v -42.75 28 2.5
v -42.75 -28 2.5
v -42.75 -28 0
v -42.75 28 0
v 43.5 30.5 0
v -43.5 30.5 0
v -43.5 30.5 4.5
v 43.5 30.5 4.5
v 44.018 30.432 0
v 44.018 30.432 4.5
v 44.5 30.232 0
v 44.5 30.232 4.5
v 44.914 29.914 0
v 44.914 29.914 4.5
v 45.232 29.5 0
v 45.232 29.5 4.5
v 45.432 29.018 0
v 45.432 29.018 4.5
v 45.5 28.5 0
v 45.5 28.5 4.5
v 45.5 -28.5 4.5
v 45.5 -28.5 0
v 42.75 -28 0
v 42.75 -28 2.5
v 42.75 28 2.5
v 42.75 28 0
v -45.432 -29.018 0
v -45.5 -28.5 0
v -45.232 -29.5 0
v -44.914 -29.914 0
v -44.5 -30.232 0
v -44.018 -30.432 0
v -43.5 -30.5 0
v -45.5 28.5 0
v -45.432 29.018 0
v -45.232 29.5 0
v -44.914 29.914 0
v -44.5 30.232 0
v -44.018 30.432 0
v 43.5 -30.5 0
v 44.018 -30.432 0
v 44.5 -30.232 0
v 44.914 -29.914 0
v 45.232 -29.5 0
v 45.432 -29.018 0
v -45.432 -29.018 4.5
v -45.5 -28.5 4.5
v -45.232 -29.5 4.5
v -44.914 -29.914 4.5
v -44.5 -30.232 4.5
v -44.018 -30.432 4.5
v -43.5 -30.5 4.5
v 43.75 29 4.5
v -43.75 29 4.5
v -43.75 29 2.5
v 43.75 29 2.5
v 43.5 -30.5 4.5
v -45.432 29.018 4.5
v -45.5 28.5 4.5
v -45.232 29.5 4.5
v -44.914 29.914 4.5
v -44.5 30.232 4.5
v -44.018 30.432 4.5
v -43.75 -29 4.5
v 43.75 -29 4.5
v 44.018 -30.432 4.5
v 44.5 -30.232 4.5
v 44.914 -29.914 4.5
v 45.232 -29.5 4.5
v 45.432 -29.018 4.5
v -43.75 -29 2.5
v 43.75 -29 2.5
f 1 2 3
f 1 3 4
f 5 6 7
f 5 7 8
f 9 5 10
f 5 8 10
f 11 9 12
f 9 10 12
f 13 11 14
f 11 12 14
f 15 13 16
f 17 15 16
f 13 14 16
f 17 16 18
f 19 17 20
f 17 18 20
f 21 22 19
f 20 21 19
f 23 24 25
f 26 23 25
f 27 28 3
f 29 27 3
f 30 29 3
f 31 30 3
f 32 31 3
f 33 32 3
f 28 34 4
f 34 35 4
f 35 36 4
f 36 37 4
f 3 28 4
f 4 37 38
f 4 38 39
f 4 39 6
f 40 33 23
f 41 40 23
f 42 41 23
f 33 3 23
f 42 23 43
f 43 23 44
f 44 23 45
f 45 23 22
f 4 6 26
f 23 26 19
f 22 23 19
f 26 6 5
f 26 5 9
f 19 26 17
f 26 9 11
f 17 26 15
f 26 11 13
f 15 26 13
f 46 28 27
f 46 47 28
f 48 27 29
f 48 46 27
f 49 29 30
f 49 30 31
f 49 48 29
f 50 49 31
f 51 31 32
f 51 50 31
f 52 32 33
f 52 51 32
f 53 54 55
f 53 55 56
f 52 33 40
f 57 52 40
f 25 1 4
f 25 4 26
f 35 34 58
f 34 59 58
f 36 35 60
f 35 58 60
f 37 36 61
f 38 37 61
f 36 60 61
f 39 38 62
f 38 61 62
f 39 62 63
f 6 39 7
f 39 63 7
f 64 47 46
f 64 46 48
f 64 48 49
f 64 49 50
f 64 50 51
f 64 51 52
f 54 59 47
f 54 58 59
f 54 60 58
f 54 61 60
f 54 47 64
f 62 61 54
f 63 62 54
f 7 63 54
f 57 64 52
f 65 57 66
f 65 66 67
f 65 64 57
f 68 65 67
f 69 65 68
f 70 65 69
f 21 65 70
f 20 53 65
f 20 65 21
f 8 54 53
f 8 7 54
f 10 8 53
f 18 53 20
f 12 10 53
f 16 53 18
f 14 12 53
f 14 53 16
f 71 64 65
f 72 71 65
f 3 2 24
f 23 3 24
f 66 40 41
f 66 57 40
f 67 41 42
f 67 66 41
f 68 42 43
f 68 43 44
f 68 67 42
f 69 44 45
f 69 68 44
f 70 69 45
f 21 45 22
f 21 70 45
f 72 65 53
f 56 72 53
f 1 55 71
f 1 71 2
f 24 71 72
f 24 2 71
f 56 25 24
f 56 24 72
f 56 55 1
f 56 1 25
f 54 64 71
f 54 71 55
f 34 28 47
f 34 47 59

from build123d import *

# Parameters (mm, degrees)
SKETCH1_W           = 91
SKETCH1_H           = 61
BOSS_EXTRUDE1_DEPTH = 4.5
SKETCH2_W           = 87.5
SKETCH2_H           = 58
CUT_EXTRUDE1_DEPTH  = 2
SKETCH3_W           = 85.5
SKETCH3_H           = 56
CUT_EXTRUDE2_DEPTH  = 3.5
FILLET1_R           = 2


with BuildPart() as part:
    # Sketch1 → Boss-Extrude1 (new body)
    with BuildSketch(Plane.XY):
        Rectangle(SKETCH1_W, SKETCH1_H)
    extrude(amount=BOSS_EXTRUDE1_DEPTH)

    # Sketch2 → Cut-Extrude1 (cut)
    with BuildSketch(Plane.XY.offset(4.5)):
        Rectangle(SKETCH2_W, SKETCH2_H)
    extrude(amount=-CUT_EXTRUDE1_DEPTH, mode=Mode.SUBTRACT)

    # Sketch3 → Cut-Extrude2 (cut, through all)
    with BuildSketch(Plane.XY.offset(2.5)):
        Rectangle(SKETCH3_W, SKETCH3_H)
    extrude(amount=-CUT_EXTRUDE2_DEPTH, mode=Mode.SUBTRACT)

    # Fillet1
    fillet1_edges = [part.edges().sort_by_distance(p)[0] for p in [
        (45.5, -30.5, 2.25),
        (-45.5, -30.5, 2.25),
        (-45.5, 30.5, 2.25),
        (45.5, 30.5, 2.25),
    ]]
    fillet(fillet1_edges, radius=FILLET1_R)


solid = part.part
